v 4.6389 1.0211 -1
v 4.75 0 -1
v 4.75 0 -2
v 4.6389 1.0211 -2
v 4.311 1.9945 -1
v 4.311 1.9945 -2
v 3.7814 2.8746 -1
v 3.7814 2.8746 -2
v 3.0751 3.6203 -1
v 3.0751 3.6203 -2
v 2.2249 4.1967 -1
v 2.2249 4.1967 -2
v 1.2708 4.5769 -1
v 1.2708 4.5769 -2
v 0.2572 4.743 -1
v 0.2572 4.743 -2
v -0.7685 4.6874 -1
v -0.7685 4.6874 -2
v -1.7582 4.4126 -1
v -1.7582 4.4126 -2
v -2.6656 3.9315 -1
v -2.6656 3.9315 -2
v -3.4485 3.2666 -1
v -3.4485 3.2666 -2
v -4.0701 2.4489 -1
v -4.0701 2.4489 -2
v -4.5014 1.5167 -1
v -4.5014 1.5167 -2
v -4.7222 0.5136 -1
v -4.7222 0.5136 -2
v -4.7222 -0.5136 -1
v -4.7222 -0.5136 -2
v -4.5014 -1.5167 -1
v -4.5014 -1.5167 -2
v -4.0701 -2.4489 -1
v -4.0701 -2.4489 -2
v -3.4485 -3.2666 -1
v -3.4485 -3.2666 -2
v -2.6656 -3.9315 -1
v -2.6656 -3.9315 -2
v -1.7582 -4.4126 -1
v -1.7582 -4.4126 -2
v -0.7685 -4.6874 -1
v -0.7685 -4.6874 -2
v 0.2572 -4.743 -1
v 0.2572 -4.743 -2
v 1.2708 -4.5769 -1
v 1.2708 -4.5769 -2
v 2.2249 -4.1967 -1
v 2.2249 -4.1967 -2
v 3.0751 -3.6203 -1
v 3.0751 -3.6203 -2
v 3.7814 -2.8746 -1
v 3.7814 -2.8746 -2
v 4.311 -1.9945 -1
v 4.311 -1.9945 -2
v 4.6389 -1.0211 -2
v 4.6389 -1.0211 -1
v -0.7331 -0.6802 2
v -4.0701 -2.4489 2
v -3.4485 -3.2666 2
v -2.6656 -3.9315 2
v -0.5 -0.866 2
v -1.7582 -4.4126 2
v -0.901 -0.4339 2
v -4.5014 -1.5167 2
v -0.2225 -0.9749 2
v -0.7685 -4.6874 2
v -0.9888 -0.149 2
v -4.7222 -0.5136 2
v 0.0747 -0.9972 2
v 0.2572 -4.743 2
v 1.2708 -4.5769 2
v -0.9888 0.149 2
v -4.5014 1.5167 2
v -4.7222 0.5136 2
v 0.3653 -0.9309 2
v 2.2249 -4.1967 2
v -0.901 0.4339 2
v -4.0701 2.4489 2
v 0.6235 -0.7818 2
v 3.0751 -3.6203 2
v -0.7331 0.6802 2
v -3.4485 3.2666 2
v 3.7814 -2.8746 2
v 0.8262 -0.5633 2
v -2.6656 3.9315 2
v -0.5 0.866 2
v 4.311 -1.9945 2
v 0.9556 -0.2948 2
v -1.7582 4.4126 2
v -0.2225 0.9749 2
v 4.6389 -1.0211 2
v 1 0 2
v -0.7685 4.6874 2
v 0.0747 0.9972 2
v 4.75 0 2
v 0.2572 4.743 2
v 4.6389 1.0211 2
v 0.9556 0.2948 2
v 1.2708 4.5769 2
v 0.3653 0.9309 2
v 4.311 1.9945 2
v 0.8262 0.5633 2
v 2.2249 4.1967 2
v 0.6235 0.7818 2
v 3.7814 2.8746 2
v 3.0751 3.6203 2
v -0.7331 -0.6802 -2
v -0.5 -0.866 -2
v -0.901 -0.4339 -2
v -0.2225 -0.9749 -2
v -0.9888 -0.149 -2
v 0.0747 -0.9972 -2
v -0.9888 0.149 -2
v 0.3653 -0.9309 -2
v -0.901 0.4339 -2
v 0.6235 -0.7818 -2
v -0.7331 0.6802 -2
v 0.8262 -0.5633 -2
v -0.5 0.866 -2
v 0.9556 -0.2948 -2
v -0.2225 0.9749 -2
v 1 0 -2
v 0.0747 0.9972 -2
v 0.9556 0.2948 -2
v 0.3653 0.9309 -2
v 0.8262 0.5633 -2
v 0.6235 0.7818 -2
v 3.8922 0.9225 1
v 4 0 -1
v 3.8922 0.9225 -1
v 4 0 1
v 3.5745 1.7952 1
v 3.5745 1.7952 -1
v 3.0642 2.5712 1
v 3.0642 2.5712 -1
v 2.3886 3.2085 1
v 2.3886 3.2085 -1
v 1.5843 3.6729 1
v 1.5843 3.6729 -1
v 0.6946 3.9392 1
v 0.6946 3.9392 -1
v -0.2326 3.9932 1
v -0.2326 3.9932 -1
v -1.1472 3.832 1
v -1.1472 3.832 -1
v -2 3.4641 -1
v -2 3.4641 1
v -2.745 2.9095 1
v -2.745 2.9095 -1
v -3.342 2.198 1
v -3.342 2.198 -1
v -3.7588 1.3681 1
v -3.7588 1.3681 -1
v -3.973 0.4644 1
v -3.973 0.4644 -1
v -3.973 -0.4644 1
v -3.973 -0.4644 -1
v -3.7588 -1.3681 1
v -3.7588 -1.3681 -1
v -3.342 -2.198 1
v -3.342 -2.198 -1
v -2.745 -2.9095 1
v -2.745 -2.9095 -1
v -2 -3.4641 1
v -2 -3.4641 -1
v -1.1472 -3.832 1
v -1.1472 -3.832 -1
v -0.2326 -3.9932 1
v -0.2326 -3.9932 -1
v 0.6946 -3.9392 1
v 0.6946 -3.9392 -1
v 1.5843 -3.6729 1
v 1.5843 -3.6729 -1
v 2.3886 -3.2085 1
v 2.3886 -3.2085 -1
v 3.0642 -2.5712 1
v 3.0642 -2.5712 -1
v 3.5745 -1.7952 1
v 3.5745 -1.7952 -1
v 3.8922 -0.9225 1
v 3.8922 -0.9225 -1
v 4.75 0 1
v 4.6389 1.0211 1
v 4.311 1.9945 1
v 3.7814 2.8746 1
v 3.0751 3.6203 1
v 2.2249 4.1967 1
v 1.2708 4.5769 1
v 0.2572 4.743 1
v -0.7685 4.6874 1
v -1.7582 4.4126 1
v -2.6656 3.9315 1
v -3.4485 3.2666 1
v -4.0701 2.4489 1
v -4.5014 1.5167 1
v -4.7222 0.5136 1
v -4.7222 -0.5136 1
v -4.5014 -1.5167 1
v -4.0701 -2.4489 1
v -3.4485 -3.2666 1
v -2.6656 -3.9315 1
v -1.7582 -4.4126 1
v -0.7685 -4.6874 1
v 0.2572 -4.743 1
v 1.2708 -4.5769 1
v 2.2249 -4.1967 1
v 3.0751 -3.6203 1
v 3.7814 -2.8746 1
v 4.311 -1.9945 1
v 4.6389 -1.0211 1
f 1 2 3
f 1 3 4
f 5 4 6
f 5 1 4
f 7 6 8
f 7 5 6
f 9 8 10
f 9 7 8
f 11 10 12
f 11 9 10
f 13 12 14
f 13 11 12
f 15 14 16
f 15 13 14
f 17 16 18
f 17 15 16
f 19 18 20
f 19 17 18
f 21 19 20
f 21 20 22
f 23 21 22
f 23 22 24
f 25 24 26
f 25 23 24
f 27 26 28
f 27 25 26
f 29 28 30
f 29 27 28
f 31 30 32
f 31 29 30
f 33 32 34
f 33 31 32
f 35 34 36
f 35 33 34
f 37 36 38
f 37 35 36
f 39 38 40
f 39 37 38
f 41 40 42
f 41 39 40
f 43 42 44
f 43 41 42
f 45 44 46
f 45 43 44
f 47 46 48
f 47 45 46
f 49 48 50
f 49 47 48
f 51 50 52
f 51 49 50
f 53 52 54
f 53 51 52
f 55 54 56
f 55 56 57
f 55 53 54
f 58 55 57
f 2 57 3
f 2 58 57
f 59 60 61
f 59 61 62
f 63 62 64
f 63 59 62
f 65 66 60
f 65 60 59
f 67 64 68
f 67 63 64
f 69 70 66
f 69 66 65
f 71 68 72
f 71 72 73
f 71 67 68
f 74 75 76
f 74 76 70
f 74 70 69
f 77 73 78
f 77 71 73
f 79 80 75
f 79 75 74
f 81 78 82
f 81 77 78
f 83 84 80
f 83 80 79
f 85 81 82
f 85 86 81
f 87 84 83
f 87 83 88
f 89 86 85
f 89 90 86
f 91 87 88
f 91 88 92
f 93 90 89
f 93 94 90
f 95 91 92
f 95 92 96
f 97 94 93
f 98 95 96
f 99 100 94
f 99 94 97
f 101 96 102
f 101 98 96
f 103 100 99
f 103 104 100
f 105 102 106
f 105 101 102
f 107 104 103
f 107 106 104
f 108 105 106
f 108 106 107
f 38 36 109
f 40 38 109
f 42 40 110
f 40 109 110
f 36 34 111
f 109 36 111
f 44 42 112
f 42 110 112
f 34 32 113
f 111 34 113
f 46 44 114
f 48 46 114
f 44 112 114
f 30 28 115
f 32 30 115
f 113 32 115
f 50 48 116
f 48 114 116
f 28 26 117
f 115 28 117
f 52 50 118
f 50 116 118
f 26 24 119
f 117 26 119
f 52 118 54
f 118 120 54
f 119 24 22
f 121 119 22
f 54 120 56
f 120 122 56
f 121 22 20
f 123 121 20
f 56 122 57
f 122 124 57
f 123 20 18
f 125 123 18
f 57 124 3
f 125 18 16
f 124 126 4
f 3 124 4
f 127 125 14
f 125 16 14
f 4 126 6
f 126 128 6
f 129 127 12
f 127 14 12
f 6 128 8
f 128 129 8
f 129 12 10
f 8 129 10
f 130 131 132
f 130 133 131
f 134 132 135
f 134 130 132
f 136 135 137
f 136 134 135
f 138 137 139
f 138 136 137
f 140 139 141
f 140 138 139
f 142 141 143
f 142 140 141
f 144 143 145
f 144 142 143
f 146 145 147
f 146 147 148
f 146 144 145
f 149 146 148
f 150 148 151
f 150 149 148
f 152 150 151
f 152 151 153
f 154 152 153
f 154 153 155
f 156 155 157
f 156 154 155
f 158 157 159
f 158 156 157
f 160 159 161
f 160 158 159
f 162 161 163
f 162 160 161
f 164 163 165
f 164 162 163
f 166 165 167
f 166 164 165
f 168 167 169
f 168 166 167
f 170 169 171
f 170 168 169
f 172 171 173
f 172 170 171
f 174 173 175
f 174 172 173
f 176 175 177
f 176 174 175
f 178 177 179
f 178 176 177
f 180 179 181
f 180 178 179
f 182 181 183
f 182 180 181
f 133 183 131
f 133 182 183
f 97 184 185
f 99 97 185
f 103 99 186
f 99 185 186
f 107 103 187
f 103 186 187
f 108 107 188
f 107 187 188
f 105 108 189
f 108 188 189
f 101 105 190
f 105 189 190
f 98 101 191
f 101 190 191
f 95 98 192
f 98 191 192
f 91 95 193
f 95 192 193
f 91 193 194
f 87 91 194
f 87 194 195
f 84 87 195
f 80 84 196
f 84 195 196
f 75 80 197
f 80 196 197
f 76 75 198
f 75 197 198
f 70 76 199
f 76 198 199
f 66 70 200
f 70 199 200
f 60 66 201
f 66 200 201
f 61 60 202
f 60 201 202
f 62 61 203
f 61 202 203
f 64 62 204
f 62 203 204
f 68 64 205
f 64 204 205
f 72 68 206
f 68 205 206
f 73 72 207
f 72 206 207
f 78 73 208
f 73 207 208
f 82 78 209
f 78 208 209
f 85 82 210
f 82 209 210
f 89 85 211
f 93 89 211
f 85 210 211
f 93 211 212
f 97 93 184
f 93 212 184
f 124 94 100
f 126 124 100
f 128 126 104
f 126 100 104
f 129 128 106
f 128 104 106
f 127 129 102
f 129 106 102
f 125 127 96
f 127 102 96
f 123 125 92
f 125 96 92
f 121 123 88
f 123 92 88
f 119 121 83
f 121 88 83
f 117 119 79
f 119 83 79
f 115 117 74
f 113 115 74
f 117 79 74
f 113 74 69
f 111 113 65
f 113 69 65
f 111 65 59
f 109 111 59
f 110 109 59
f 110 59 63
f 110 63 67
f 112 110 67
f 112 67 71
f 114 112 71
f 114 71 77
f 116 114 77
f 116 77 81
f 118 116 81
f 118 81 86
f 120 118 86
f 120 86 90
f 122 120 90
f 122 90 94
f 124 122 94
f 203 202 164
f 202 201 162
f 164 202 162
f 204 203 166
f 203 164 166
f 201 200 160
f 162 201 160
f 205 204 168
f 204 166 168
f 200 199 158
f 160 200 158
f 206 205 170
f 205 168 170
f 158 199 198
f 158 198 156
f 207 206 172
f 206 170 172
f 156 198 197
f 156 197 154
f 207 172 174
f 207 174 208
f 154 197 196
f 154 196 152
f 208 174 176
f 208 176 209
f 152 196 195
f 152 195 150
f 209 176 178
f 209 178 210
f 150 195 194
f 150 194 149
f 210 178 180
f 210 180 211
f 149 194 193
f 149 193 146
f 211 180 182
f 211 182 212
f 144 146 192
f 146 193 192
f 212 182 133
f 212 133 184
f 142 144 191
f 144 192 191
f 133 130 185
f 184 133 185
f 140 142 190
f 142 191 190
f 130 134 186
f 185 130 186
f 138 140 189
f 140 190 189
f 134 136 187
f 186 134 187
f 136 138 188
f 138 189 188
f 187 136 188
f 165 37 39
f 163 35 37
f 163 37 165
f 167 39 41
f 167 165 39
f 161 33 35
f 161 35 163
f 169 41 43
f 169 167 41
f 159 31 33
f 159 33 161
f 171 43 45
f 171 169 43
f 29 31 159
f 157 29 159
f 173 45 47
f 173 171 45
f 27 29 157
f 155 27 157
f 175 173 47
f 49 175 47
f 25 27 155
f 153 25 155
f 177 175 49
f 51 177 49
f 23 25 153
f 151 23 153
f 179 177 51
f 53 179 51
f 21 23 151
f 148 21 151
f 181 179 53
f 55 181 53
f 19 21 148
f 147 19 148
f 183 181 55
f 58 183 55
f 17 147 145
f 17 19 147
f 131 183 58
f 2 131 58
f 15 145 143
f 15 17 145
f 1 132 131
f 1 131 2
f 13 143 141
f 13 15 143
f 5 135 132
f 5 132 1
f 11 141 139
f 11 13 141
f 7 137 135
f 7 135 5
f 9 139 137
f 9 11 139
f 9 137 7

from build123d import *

# Parameters (mm, degrees)
SKETCH1_R           = 4
BOSS_EXTRUDE1_DEPTH = 1
SKETCH3_R           = 4.75
BOSS_EXTRUDE3_DEPTH = 1
SKETCH4_R           = 1
CUT_EXTRUDE1_DEPTH  = 8.818247886


with BuildPart() as part:
    # Sketch1 → Boss-Extrude1 (new, symmetric)
    with BuildSketch(Plane.XY):
        Circle(SKETCH1_R)
    extrude(amount=BOSS_EXTRUDE1_DEPTH, both=True)

    # Sketch3 → Boss-Extrude3 (add)
    with BuildSketch(Plane.XY.offset(1)):
        Circle(SKETCH3_R)
    boss_extrude3 = extrude(amount=BOSS_EXTRUDE3_DEPTH)

    # Mirror1: Boss-Extrude3 across plane
    add(boss_extrude3.mirror(Plane.XY))

    # Sketch4 → Cut-Extrude1 (cut, through all)
    with BuildSketch(Plane.XY.offset(2)):
        Circle(SKETCH4_R)
    extrude(amount=-CUT_EXTRUDE1_DEPTH, mode=Mode.SUBTRACT)


solid = part.part
